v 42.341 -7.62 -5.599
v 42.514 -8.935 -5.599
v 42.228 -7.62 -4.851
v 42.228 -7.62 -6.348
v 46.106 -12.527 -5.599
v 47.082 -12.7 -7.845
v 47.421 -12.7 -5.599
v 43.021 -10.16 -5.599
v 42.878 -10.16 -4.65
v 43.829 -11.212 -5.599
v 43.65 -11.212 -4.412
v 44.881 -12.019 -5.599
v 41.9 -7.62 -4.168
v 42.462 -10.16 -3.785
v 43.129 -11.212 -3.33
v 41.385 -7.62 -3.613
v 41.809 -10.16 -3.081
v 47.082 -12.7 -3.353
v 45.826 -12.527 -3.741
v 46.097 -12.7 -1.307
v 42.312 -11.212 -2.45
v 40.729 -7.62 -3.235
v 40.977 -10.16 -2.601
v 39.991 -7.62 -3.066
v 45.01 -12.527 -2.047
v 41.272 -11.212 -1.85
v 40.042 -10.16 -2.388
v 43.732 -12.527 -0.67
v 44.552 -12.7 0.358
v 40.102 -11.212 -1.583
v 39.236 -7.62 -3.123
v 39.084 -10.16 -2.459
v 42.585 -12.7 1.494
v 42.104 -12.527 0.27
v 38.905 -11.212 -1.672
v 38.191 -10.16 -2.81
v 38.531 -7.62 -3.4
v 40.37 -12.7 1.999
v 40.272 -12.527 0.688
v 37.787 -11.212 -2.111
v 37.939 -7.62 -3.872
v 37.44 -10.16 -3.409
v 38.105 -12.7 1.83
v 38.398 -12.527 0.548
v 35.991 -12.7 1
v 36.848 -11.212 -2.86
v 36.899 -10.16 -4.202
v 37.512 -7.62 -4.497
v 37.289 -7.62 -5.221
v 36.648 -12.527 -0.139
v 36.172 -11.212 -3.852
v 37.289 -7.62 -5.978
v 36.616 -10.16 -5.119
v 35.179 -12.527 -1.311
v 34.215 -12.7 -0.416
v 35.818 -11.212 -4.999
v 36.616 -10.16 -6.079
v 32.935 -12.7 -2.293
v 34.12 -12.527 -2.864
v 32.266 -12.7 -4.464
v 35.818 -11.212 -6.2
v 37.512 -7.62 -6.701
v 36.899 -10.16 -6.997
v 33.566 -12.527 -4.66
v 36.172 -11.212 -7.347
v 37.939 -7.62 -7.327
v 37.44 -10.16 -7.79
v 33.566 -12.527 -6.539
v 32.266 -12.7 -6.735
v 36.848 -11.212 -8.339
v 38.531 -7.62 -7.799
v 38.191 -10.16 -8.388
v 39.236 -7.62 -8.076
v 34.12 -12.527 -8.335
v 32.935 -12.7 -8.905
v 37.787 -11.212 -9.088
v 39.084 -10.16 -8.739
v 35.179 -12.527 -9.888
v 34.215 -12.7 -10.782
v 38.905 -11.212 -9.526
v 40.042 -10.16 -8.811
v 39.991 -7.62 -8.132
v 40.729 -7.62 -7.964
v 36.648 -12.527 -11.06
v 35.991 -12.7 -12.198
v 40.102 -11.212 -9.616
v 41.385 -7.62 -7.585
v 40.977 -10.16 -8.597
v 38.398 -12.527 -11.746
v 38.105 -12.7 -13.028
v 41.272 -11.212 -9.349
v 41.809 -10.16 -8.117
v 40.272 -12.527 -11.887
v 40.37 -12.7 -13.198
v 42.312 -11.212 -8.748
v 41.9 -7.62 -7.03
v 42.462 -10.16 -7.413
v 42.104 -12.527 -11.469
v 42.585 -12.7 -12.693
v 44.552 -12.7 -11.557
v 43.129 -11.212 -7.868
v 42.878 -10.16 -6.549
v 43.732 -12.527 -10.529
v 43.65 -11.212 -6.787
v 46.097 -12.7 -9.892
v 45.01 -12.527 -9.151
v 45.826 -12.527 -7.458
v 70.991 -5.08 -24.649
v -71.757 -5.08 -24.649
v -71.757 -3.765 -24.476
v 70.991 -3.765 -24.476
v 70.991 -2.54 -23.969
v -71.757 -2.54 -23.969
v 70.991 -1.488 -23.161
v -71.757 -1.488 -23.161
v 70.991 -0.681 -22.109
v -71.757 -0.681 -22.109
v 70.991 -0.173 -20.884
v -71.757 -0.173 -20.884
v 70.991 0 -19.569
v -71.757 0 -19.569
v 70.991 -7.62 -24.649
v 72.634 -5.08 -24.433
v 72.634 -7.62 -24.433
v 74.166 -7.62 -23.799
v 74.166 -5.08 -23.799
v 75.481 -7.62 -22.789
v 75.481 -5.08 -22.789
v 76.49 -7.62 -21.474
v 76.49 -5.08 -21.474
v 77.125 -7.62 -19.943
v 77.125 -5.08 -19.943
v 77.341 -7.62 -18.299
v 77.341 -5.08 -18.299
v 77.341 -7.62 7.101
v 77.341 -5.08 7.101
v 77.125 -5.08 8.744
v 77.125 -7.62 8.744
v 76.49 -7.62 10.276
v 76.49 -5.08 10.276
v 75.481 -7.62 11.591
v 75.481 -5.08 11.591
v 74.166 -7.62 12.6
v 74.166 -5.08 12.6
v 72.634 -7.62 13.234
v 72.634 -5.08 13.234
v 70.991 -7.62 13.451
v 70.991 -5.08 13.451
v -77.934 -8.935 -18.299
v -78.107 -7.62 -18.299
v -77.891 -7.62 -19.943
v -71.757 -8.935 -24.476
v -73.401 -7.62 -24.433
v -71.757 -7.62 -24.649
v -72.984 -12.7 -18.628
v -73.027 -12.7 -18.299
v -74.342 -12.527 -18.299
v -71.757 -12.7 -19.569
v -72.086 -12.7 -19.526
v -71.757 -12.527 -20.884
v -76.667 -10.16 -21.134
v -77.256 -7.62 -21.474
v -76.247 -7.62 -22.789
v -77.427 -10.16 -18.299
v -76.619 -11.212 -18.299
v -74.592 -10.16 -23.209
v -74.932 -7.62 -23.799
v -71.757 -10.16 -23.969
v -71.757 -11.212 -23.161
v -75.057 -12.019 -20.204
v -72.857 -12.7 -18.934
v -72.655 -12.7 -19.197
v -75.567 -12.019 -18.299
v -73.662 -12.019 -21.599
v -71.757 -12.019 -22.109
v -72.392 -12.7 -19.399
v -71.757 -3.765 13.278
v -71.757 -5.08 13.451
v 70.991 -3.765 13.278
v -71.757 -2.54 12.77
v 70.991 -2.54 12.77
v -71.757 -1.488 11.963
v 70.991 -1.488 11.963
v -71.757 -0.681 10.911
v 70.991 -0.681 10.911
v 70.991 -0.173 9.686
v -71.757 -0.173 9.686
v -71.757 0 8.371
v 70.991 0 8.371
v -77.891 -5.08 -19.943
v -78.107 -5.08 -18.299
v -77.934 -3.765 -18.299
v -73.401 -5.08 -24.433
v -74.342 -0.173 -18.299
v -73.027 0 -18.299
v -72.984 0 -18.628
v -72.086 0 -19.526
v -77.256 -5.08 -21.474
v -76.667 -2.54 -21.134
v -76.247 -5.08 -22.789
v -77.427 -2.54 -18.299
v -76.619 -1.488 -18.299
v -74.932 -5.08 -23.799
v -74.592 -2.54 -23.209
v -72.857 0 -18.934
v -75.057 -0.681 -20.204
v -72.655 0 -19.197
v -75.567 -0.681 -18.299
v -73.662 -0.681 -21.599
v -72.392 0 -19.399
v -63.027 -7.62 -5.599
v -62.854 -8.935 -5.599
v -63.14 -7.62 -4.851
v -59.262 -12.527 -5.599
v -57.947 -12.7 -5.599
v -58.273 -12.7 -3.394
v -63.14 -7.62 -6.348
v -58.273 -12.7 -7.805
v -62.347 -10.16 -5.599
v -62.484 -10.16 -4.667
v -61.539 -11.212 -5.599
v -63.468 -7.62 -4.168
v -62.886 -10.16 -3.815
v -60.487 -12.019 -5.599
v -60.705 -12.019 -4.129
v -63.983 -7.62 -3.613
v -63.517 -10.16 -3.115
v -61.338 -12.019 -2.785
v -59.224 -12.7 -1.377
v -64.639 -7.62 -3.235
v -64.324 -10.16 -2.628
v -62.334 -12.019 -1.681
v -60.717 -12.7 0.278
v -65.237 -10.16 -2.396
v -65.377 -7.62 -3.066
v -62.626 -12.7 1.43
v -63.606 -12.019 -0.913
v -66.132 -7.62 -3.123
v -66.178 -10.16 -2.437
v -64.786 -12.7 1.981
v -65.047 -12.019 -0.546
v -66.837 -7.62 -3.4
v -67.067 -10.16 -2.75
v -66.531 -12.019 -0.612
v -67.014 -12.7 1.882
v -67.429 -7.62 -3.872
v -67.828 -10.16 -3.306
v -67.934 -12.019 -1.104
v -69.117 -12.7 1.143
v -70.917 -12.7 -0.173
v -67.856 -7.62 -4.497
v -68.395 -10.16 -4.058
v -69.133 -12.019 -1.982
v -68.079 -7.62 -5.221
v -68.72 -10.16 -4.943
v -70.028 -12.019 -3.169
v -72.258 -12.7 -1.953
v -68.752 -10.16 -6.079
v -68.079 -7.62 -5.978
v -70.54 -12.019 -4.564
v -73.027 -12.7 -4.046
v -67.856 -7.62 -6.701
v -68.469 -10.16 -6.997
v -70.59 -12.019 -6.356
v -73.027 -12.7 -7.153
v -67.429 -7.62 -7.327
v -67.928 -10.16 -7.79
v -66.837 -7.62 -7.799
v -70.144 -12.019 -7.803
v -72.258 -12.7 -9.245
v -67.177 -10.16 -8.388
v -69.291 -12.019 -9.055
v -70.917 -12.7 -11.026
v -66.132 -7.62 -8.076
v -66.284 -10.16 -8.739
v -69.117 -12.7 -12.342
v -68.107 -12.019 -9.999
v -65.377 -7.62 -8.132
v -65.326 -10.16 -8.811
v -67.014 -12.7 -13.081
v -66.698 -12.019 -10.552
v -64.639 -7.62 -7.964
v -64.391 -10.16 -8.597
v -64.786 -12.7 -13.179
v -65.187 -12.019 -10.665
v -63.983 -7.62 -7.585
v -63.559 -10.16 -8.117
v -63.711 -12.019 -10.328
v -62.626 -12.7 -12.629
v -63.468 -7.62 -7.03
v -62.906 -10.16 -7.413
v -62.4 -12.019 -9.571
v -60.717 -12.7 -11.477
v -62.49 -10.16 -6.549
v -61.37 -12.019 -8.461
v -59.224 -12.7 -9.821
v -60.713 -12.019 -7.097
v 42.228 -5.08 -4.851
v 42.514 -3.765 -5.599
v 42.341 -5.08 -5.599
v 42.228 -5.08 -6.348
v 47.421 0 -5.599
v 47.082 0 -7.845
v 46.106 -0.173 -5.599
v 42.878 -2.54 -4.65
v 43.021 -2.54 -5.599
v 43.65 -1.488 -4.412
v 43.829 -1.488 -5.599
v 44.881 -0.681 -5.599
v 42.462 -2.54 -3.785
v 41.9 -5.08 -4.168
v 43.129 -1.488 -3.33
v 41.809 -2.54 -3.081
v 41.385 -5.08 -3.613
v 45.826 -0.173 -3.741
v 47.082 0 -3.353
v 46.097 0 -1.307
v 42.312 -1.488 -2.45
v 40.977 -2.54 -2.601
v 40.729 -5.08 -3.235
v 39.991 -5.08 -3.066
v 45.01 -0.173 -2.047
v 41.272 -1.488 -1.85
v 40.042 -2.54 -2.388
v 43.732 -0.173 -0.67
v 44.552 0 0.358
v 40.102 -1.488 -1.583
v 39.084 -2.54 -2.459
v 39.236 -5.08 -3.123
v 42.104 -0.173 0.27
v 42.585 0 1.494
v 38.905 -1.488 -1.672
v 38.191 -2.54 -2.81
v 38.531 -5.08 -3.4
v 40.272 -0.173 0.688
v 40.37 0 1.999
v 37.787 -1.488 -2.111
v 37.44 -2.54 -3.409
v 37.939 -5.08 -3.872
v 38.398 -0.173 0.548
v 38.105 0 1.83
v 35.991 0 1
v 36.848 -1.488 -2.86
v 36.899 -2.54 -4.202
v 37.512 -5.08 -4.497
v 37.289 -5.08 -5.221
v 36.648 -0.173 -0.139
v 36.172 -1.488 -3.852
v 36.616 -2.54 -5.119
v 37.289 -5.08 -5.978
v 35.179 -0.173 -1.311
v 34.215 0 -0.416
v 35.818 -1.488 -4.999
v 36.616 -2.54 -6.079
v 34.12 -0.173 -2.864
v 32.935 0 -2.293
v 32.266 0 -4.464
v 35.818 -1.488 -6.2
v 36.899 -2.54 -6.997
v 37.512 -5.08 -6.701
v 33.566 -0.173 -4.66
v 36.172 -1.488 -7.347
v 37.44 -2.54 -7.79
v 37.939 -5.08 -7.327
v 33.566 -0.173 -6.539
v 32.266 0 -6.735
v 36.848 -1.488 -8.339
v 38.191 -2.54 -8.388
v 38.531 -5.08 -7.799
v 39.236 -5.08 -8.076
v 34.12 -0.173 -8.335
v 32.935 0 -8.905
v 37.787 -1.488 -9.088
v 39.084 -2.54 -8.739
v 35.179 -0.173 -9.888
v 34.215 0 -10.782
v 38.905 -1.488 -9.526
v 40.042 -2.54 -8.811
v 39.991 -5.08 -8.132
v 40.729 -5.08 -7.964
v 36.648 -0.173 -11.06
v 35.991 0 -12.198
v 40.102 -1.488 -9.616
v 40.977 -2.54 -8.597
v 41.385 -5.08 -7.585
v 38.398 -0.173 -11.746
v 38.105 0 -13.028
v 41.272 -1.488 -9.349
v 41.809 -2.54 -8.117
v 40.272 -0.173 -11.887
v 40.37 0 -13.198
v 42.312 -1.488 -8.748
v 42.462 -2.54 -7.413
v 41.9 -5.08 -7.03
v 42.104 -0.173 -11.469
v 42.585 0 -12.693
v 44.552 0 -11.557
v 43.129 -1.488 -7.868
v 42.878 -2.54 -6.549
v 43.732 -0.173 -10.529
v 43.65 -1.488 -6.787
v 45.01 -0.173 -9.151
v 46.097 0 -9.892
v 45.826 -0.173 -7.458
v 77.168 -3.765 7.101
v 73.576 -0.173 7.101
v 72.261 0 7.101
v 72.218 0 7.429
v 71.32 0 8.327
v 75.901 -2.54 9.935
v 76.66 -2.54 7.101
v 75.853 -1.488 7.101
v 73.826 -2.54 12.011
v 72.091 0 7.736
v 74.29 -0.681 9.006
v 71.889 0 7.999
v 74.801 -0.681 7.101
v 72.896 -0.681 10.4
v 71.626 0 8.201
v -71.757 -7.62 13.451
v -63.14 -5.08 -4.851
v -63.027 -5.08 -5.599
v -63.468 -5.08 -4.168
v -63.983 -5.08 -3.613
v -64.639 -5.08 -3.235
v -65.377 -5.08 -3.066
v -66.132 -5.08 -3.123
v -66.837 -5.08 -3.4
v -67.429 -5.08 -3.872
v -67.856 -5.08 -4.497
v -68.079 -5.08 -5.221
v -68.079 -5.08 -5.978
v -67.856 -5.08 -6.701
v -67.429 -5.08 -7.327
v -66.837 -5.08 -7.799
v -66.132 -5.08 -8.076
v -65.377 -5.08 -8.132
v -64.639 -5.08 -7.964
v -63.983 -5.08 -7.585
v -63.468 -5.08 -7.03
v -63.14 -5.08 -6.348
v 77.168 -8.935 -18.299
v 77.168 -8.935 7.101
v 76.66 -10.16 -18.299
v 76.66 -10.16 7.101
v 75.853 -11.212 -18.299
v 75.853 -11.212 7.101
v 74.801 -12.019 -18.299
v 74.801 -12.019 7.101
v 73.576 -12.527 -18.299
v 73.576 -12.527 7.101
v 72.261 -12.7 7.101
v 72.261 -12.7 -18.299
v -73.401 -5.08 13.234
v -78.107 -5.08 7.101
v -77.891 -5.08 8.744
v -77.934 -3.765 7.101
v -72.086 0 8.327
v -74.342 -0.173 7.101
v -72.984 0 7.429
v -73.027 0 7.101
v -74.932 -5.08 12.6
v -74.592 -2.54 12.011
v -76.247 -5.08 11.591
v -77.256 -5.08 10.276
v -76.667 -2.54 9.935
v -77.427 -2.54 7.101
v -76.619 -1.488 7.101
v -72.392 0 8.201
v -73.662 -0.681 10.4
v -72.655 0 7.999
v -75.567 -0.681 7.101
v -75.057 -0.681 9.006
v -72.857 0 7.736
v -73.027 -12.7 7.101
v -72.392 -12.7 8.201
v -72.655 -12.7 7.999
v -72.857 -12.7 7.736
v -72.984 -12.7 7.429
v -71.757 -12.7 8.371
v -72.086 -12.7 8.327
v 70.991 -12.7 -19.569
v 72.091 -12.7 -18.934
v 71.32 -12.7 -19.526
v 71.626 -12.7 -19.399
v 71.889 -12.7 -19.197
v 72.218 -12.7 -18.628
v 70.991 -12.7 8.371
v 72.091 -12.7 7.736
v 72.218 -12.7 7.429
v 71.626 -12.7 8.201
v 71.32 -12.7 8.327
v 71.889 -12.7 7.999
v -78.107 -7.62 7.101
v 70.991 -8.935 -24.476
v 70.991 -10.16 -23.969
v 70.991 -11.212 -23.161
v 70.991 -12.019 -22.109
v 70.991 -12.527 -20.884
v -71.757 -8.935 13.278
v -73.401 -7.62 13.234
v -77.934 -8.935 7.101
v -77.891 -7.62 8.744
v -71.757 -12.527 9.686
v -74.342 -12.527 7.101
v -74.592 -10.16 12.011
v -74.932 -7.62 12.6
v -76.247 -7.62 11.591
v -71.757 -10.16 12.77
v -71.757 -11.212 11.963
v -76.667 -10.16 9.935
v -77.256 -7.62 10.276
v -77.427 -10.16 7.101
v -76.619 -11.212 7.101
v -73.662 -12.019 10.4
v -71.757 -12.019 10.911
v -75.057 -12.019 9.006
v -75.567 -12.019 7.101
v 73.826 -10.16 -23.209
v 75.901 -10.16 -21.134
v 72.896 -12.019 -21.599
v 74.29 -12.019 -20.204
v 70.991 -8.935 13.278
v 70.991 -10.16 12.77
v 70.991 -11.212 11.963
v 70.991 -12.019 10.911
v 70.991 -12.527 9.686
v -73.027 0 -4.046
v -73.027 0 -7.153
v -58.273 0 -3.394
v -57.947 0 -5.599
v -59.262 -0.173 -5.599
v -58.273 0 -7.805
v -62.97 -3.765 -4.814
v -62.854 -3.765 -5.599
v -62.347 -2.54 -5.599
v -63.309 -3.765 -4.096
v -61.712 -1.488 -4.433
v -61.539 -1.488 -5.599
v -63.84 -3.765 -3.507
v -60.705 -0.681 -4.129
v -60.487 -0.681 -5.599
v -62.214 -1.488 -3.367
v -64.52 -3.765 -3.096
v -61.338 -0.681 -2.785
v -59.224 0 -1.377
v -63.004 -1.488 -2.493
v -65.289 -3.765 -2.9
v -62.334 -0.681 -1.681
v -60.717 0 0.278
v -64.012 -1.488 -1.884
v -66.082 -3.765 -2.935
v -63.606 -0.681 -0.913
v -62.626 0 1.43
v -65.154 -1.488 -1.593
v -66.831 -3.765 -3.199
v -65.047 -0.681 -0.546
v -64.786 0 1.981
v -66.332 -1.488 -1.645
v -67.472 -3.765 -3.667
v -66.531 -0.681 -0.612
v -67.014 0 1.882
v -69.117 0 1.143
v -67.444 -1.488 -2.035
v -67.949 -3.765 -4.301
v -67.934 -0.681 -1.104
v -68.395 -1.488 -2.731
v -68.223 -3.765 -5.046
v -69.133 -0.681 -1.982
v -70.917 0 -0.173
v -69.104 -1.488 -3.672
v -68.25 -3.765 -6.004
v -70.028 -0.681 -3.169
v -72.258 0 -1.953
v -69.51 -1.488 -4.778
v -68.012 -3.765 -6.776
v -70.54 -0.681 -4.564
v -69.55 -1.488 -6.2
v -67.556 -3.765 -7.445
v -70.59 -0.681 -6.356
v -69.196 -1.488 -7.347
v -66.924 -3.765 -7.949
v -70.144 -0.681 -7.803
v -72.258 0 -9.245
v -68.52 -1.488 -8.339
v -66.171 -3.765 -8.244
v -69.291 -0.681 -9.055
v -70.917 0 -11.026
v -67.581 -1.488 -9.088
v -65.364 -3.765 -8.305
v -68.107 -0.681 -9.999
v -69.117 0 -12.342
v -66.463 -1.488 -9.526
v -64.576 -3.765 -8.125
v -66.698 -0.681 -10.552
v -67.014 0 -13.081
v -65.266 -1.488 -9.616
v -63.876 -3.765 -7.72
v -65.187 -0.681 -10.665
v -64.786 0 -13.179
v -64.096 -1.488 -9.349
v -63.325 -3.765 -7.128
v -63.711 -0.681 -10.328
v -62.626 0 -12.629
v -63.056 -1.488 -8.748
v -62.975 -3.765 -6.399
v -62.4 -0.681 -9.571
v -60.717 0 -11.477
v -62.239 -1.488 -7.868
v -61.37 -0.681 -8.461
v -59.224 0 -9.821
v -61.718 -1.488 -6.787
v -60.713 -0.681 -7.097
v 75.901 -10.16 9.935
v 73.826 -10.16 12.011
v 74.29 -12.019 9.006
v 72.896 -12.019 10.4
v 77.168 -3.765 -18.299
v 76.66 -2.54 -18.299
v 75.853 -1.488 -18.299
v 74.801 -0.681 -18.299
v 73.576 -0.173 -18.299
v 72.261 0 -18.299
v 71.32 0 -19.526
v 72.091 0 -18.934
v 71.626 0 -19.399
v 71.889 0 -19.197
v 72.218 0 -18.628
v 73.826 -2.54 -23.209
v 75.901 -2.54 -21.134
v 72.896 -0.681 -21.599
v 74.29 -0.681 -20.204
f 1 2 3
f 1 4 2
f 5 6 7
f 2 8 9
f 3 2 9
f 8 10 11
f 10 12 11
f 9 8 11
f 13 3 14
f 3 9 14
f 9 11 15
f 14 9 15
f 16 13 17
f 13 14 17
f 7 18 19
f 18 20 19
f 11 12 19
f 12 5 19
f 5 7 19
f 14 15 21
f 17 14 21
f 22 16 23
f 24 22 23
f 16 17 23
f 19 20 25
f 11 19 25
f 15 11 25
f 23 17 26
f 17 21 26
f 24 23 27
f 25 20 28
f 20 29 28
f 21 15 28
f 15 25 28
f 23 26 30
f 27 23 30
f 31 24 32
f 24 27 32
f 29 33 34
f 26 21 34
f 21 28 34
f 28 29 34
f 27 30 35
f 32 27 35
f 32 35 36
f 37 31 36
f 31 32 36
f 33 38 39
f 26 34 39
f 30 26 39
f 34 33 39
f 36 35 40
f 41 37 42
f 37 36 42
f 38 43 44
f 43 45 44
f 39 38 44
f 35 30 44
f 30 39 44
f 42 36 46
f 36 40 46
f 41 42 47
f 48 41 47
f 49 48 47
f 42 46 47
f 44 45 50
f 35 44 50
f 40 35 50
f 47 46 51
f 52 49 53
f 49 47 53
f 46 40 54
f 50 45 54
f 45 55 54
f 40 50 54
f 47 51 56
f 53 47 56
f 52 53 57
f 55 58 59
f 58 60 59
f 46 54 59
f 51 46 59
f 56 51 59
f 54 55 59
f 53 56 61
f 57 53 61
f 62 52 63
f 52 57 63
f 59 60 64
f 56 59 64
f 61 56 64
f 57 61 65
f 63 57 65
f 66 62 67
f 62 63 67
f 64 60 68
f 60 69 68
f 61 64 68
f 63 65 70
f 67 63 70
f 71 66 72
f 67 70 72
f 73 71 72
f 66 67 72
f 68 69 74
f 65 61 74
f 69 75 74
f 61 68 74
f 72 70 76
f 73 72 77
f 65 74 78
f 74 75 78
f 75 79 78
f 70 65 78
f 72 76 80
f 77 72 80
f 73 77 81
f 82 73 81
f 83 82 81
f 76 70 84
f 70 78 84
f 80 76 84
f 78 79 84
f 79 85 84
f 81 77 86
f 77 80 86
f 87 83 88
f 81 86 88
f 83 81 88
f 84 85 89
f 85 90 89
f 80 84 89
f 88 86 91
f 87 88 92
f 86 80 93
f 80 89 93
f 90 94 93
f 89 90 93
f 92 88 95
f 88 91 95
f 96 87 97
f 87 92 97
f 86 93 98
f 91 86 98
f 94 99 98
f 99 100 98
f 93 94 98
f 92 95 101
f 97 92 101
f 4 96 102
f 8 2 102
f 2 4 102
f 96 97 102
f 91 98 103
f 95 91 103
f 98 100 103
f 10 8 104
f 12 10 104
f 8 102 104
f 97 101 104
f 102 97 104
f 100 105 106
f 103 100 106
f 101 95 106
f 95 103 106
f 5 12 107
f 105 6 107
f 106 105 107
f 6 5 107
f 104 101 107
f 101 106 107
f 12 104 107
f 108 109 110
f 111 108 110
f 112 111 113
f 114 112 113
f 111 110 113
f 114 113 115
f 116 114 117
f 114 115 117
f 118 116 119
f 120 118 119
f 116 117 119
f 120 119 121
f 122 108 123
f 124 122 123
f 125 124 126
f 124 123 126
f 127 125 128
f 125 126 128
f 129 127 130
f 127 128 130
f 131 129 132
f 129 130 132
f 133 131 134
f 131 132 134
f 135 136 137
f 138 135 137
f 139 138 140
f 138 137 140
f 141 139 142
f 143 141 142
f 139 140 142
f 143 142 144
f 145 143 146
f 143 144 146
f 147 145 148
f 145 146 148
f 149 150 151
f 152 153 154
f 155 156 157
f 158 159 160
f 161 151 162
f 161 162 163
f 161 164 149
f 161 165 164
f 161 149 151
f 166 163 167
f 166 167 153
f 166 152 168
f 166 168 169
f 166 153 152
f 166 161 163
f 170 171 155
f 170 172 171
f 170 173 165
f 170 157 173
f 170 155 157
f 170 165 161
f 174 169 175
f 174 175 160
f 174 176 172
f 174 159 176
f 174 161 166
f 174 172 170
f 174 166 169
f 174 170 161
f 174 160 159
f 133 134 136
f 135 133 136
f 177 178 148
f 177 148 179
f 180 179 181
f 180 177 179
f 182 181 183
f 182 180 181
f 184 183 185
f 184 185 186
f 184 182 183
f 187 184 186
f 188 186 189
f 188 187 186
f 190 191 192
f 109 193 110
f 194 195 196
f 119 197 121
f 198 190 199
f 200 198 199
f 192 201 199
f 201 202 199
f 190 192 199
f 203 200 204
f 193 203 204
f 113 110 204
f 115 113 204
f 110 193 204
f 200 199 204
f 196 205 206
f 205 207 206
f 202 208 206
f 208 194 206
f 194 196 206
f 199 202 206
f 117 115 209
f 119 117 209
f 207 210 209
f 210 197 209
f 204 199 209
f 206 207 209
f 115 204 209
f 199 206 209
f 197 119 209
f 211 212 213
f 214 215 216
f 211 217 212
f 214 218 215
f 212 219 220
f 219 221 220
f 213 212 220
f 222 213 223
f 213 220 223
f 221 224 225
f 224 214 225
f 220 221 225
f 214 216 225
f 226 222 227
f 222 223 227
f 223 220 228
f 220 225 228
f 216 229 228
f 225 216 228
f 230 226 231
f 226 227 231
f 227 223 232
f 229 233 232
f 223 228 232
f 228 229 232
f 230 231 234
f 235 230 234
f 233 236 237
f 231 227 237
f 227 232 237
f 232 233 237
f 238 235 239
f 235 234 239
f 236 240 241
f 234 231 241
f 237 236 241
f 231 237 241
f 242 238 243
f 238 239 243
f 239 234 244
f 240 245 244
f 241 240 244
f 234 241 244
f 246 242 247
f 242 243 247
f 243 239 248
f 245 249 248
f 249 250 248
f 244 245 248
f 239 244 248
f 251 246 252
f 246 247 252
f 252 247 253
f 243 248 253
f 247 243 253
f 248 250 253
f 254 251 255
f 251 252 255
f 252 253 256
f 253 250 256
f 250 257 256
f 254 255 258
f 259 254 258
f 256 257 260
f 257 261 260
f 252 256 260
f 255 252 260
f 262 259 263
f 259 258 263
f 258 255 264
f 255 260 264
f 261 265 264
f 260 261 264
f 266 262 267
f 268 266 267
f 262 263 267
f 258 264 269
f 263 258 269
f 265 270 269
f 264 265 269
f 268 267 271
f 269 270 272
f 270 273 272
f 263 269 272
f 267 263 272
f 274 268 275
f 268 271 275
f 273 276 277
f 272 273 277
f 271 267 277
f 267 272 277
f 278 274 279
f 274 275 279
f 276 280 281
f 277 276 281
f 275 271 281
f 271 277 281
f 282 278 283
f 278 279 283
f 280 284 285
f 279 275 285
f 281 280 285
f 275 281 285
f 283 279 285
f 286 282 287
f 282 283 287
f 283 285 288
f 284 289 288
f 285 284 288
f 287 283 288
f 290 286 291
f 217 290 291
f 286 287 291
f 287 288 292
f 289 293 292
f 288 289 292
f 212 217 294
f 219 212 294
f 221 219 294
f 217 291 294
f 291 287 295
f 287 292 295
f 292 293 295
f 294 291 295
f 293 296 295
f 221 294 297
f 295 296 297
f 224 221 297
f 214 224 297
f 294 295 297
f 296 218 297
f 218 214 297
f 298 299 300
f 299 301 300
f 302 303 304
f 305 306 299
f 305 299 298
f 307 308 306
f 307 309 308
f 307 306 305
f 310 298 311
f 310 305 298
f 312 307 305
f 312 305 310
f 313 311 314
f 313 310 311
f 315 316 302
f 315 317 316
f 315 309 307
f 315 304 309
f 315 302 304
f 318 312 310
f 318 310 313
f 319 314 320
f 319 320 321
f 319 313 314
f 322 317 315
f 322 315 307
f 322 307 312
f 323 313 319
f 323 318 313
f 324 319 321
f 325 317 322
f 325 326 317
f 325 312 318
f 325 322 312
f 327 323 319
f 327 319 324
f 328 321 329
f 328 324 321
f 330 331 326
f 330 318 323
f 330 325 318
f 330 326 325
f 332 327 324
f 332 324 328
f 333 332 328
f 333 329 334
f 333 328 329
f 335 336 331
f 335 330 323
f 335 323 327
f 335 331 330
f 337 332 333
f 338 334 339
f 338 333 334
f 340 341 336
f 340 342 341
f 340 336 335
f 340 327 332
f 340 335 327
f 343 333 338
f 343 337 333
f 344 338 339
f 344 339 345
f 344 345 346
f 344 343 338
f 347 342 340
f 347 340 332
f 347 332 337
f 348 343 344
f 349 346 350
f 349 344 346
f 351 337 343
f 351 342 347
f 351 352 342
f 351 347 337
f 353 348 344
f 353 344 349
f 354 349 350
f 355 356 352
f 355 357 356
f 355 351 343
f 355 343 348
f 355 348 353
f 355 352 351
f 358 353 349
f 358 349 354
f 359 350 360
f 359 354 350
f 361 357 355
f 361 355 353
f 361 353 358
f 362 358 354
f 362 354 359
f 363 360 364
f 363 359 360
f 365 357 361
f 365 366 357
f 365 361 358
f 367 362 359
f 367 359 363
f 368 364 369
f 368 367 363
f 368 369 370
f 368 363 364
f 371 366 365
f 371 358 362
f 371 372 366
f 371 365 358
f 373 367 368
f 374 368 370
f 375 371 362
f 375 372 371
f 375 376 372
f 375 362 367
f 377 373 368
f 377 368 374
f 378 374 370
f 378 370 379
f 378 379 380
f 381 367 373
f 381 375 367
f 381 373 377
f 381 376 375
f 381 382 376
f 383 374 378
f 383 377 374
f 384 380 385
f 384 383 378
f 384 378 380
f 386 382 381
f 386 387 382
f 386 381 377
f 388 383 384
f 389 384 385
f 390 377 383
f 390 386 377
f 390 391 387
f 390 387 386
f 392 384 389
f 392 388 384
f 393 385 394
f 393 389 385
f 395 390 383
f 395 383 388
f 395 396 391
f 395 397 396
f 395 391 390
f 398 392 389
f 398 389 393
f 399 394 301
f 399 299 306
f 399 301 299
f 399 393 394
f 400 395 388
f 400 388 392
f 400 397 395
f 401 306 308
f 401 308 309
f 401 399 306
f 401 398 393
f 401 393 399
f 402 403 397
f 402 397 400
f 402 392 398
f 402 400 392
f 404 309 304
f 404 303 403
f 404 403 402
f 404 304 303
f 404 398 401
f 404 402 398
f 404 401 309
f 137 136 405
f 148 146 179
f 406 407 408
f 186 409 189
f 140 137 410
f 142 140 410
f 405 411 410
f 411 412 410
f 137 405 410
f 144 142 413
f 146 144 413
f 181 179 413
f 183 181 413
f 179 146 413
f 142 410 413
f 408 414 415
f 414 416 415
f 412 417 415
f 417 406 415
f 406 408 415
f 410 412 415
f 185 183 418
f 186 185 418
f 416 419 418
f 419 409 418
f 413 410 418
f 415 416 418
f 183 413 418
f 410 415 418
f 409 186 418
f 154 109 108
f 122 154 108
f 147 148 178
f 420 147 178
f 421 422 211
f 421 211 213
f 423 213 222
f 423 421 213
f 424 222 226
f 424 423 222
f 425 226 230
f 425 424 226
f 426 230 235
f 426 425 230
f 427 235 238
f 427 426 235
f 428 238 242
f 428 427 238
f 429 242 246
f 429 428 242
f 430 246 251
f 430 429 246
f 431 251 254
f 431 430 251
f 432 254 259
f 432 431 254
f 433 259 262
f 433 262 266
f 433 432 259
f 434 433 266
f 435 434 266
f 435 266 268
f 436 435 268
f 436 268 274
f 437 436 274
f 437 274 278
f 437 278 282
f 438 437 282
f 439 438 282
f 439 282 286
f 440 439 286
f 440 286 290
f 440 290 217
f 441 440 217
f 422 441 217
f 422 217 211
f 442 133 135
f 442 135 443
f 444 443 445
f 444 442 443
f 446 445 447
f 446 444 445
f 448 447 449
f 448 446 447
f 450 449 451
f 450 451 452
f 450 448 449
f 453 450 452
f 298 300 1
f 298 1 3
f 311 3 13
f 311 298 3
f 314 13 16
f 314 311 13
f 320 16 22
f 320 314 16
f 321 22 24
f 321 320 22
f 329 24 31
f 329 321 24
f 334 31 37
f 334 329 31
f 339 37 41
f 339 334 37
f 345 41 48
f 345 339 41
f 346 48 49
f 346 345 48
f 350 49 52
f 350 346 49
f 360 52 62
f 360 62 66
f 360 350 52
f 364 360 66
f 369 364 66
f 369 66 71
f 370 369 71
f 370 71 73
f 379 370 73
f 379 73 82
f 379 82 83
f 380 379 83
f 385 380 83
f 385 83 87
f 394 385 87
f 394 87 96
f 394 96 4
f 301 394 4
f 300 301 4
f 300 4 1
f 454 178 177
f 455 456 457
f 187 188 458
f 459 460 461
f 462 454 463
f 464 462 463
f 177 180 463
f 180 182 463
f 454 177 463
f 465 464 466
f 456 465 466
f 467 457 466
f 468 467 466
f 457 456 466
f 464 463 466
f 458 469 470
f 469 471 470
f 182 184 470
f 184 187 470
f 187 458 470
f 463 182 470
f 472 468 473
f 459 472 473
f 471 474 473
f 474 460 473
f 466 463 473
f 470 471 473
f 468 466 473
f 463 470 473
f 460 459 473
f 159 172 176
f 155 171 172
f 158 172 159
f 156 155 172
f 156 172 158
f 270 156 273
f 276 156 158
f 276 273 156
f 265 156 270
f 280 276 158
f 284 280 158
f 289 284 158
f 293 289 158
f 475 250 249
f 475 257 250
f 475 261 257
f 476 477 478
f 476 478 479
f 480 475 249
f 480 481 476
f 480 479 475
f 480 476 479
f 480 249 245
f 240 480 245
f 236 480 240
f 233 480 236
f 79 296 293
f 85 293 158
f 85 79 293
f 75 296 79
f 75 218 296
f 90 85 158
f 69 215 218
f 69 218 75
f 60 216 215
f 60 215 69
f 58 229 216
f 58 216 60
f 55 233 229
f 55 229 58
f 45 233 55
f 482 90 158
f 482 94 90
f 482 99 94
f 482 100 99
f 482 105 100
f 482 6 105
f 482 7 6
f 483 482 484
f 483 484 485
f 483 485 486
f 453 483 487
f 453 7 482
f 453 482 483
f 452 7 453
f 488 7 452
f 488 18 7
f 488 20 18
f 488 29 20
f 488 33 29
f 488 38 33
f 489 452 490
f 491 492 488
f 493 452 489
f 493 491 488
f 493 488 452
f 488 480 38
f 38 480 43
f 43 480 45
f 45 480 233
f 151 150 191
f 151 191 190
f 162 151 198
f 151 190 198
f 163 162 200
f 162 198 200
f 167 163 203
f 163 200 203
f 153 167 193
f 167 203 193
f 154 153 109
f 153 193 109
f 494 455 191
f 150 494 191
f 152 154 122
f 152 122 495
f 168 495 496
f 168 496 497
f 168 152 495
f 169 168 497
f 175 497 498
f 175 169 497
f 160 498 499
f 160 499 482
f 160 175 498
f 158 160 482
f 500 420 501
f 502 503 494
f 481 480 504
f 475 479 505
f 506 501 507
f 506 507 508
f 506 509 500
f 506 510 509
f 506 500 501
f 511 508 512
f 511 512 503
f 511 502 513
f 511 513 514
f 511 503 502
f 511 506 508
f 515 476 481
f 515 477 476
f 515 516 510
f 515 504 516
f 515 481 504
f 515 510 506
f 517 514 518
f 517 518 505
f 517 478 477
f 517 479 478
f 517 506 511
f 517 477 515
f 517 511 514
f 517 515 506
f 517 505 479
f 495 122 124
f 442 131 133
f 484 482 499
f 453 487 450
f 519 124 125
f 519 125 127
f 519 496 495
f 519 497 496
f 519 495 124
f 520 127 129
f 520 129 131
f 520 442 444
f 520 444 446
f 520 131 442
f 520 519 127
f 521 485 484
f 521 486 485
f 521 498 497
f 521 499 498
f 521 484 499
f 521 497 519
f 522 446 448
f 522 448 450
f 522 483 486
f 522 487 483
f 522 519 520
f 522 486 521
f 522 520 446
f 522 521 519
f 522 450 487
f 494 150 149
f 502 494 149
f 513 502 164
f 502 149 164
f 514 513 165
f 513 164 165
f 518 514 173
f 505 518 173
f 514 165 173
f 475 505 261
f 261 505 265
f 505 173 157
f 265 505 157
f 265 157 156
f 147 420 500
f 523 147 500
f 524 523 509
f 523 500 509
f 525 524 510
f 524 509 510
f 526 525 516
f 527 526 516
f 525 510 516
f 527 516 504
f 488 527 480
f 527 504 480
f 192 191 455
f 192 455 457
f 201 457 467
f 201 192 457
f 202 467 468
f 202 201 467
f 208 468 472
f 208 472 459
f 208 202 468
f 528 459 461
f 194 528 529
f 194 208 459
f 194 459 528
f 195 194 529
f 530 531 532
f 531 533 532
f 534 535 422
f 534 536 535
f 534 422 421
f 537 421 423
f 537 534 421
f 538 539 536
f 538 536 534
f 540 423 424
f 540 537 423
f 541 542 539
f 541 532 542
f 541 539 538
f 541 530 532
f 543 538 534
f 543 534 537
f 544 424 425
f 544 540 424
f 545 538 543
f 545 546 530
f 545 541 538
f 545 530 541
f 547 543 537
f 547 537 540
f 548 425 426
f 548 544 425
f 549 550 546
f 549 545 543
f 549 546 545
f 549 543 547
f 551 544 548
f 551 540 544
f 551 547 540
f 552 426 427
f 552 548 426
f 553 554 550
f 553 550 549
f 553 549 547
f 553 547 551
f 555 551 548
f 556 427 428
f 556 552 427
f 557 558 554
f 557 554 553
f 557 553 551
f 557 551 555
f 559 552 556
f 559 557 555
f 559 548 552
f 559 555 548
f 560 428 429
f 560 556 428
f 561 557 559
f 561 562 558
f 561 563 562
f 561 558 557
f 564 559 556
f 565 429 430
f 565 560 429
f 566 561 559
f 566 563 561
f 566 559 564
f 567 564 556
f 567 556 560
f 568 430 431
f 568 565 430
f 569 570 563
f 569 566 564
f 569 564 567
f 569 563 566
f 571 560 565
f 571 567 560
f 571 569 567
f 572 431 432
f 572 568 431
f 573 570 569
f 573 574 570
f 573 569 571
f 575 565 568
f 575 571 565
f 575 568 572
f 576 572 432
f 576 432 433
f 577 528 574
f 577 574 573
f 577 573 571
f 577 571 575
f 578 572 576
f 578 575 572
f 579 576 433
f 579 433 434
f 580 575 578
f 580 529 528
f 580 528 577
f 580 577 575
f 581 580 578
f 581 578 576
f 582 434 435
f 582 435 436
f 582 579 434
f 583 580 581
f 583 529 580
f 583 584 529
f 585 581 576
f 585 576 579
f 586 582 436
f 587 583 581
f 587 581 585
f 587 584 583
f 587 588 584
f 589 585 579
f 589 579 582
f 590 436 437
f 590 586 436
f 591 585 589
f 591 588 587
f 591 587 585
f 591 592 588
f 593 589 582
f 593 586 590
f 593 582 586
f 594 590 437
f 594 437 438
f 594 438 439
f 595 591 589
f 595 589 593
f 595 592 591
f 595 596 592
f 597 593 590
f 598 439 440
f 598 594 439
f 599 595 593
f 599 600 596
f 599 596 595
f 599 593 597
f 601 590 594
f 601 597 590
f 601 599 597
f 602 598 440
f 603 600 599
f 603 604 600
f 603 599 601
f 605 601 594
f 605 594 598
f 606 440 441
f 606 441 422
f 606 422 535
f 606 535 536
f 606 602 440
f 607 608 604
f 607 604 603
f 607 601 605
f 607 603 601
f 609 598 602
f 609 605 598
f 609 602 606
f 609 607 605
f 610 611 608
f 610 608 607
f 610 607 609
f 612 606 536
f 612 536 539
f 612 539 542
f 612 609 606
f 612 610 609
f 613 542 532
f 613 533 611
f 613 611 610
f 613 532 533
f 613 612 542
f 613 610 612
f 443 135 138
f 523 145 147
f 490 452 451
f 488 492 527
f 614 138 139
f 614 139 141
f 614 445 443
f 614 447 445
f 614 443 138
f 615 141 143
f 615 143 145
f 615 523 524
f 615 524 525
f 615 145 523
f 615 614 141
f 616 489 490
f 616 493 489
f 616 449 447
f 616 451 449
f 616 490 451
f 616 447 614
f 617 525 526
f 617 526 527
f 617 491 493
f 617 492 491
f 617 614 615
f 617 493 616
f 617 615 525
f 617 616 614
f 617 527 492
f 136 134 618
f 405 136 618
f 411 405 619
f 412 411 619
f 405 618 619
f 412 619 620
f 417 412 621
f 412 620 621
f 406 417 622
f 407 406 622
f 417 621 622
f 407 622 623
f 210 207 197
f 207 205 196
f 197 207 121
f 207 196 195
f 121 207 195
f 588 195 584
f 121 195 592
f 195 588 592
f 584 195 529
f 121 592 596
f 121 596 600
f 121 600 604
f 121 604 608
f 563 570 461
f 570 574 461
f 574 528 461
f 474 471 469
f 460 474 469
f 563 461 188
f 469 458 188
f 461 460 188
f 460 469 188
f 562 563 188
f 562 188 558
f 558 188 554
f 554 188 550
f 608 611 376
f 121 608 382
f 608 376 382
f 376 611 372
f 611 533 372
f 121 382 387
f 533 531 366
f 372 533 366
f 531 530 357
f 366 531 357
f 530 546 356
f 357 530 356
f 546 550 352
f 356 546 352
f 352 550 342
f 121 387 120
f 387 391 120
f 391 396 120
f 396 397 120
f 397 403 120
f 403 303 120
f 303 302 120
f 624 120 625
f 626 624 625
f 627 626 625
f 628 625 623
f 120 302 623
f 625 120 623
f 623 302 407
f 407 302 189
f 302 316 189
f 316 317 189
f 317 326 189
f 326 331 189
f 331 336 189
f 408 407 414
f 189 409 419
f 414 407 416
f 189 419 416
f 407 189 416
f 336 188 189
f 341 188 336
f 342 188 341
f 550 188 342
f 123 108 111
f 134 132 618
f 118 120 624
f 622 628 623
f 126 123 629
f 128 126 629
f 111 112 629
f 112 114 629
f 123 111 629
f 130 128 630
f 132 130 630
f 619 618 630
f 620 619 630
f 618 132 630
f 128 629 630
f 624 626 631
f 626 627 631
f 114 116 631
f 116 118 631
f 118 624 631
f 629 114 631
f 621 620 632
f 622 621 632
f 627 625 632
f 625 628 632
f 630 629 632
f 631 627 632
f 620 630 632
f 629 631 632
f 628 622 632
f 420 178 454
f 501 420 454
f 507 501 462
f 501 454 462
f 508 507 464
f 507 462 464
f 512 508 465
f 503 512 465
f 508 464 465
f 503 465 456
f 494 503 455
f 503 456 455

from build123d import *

# Parameters (mm, degrees)
F0_R         = 2.54
F1_DEPTH     = 12.7
F2_T1_DEPTH  = 142.748
F2_T3_DEPTH  = 25.4
F2_T6_ANGLE  = 90
F2_T8_ANGLE  = 90
F2_T10_ANGLE = 90
F2_T12_ANGLE = 90
F2_T18_ANGLE = 90
F2_T20_ANGLE = 90
F2_T22_ANGLE = 90
F2_T24_ANGLE = 90


# Not quite as in the source:
# - a fillet or chamfer that OpenCascade refuses, or shapes differently, is made with other operations: its cross-section is extruded or revolved along the edge and cut away or added


with BuildPart() as f1:
    # F0 (on Front) → F1 (new body)
    with BuildSketch(Plane.XZ):
        with BuildLine():
            Line((70.9908799698, 13.4507374847), (-71.7571200302, 13.4507374847))
            ThreePointArc((-71.7571200302, 13.4507374847), (-76.2472480907, 11.5908655453), (-78.1071200302, 7.1007374847))
            Line((-78.1071200302, 7.1007374847), (-78.1071200302, -18.2992625153))
            ThreePointArc((-78.1071200302, -18.2992625153), (-76.2472480907, -22.7893905758), (-71.7571200302, -24.6492625153))
            Line((-71.7571200302, -24.6492625153), (70.9908799698, -24.6492625153))
            ThreePointArc((70.9908799698, -24.6492625153), (75.4810080304, -22.7893905758), (77.3408799698, -18.2992625153))
            Line((77.3408799698, -18.2992625153), (77.3408799698, 7.1007374847))
            ThreePointArc((77.3408799698, 7.1007374847), (75.4810080304, 11.5908655453), (70.9908799698, 13.4507374847))
        make_face()
        with Locations((-65.5671200302, -5.5992625153)):
            Circle(F0_R, mode=Mode.SUBTRACT)
        with Locations((39.8008799698, -5.5992626585)):
            Circle(F0_R, mode=Mode.SUBTRACT)
    extrude(amount=F1_DEPTH)

    # F2: fillet of radius 5.08 on 20 edges, made by hand

    # F2_s2 → F2_t1 (cut)
    with BuildSketch(Plane.YZ.offset(-71.7571200302)):
        with BuildLine():
            ThreePointArc((-7.62, 13.4507374847), (-11.2121024484, 11.9628399332), (-12.7, 8.3707374847))
            Line((-12.7, 8.3707374847), (-12.7, 13.4507374847))
            Line((-12.7, 13.4507374847), (-7.62, 13.4507374847))
        make_face()
        with BuildLine():
            ThreePointArc((-5.08, 13.4507374847), (-1.4878975516, 11.9628399332), (0, 8.3707374847))
            Line((0, 8.3707374847), (0, 13.4507374847))
            Line((0, 13.4507374847), (-5.08, 13.4507374847))
        make_face()
        with BuildLine():
            ThreePointArc((-7.62, -24.6492625153), (-11.2121024484, -23.1613649637), (-12.7, -19.5692625153))
            Line((-12.7, -19.5692625153), (-12.7, -24.6492625153))
            Line((-12.7, -24.6492625153), (-7.62, -24.6492625153))
        make_face()
        with BuildLine():
            ThreePointArc((-5.08, -24.6492625153), (-1.4878975516, -23.1613649637), (0, -19.5692625153))
            Line((0, -19.5692625153), (0, -24.6492625153))
            Line((0, -24.6492625153), (-5.08, -24.6492625153))
        make_face()
    extrude(amount=F2_T1_DEPTH, mode=Mode.SUBTRACT)

    # F2_s4 → F2_t3 (cut)
    with BuildSketch(Plane.XY.offset(-18.2992625153)):
        with BuildLine():
            ThreePointArc((-78.1071200302, -5.08), (-76.6192224786, -1.4878975516), (-73.0271200302, 0))
            Line((-73.0271200302, 0), (-78.1071200302, 0))
            Line((-78.1071200302, 0), (-78.1071200302, -5.08))
        make_face()
        with BuildLine():
            ThreePointArc((77.3408799698, -5.08), (75.8529824183, -1.4878975516), (72.2608799698, 0))
            Line((72.2608799698, 0), (77.3408799698, 0))
            Line((77.3408799698, 0), (77.3408799698, -5.08))
        make_face()
        with BuildLine():
            ThreePointArc((-78.1071200302, -7.62), (-76.6192224786, -11.2121024484), (-73.0271200302, -12.7))
            Line((-73.0271200302, -12.7), (-78.1071200302, -12.7))
            Line((-78.1071200302, -12.7), (-78.1071200302, -7.62))
        make_face()
        with BuildLine():
            ThreePointArc((77.3408799698, -7.62), (75.8529824183, -11.2121024484), (72.2608799698, -12.7))
            Line((72.2608799698, -12.7), (77.3408799698, -12.7))
            Line((77.3408799698, -12.7), (77.3408799698, -7.62))
        make_face()
    extrude(amount=F2_T3_DEPTH, mode=Mode.SUBTRACT)

    # F2_s5 → F2_t6 (revolve, cut)
    with BuildSketch(Plane.YZ.offset(-71.7571200302)):
        with BuildLine():
            ThreePointArc((-5.08, 13.4507374847), (-1.4878975516, 11.9628399332), (0, 8.3707374847))
            Line((0, 8.3707374847), (0, 13.4507374847))
            Line((0, 13.4507374847), (-5.08, 13.4507374847))
        make_face()
    revolve(axis=Axis((-71.7571200302, 0, 7.1007374847), (0, -1, 0)), revolution_arc=F2_T6_ANGLE, mode=Mode.SUBTRACT)

    # F2_s7 → F2_t8 (revolve, cut)
    with BuildSketch(Plane.XY.offset(-18.2992625153)):
        with BuildLine():
            ThreePointArc((-78.1071200302, -5.08), (-76.6192224786, -1.4878975516), (-73.0271200302, 0))
            Line((-73.0271200302, 0), (-78.1071200302, 0))
            Line((-78.1071200302, 0), (-78.1071200302, -5.08))
        make_face()
    revolve(axis=Axis((-71.7571200302, 0, -18.2992625153), (0, -1, 0)), revolution_arc=F2_T8_ANGLE, mode=Mode.SUBTRACT)

    # F2_s9 → F2_t10 (revolve, cut)
    with BuildSketch(Plane.YZ.offset(70.9908799698)):
        with BuildLine():
            ThreePointArc((-5.08, -24.6492625153), (-1.4878975516, -23.1613649637), (0, -19.5692625153))
            Line((0, -19.5692625153), (0, -24.6492625153))
            Line((0, -24.6492625153), (-5.08, -24.6492625153))
        make_face()
    revolve(axis=Axis((70.9908799698, 0, -18.2992625153), (0, -1, 0)), revolution_arc=F2_T10_ANGLE, mode=Mode.SUBTRACT)

    # F2_s11 → F2_t12 (revolve, cut)
    with BuildSketch(Plane.XY.offset(7.1007374847)):
        with BuildLine():
            ThreePointArc((77.3408799698, -5.08), (75.8529824183, -1.4878975516), (72.2608799698, 0))
            Line((72.2608799698, 0), (77.3408799698, 0))
            Line((77.3408799698, 0), (77.3408799698, -5.08))
        make_face()
    revolve(axis=Axis((70.9908799698, 0, 7.1007374847), (0, -1, 0)), revolution_arc=F2_T12_ANGLE, mode=Mode.SUBTRACT)

    # F2_s13 → F2_t14 (revolve, cut)
    with BuildSketch(Plane.XY.offset(-5.5992625153)):
        with BuildLine():
            ThreePointArc((-63.0271200302, -5.08), (-61.5392224786, -1.4878975516), (-57.9471200302, 0))
            Line((-57.9471200302, 0), (-63.0271200302, 0))
            Line((-63.0271200302, 0), (-63.0271200302, -5.08))
        make_face()
    revolve(axis=Axis((-65.5671200302, 0, -5.5992625153), (0, -1, 0)), mode=Mode.SUBTRACT)

    # F2_s15 → F2_t16 (revolve, cut)
    with BuildSketch(Plane.XY.offset(-5.5992626585)):
        with BuildLine():
            ThreePointArc((42.3408799698, -5.08), (43.8287775214, -1.4878975516), (47.4208799698, 0))
            Line((47.4208799698, 0), (42.3408799698, 0))
            Line((42.3408799698, 0), (42.3408799698, -5.08))
        make_face()
    revolve(axis=Axis((39.8008799698, 0, -5.5992626585), (0, -1, 0)), mode=Mode.SUBTRACT)

    # F2_s17 → F2_t18 (revolve, cut)
    with BuildSketch(Plane.YZ.offset(-71.7571200302)):
        with BuildLine():
            ThreePointArc((-7.62, 13.4507374847), (-11.2121024484, 11.9628399332), (-12.7, 8.3707374847))
            Line((-12.7, 8.3707374847), (-12.7, 13.4507374847))
            Line((-12.7, 13.4507374847), (-7.62, 13.4507374847))
        make_face()
    revolve(axis=Axis((-71.7571200302, -12.7, 7.1007374847), (0, -1, 0)), revolution_arc=F2_T18_ANGLE, mode=Mode.SUBTRACT)

    # F2_s19 → F2_t20 (revolve, cut)
    with BuildSketch(Plane.XY.offset(-18.2992625153)):
        with BuildLine():
            ThreePointArc((-78.1071200302, -7.62), (-76.6192224786, -11.2121024484), (-73.0271200302, -12.7))
            Line((-73.0271200302, -12.7), (-78.1071200302, -12.7))
            Line((-78.1071200302, -12.7), (-78.1071200302, -7.62))
        make_face()
    revolve(axis=Axis((-71.7571200302, -12.7, -18.2992625153), (0, -1, 0)), revolution_arc=F2_T20_ANGLE, mode=Mode.SUBTRACT)

    # F2_s21 → F2_t22 (revolve, cut)
    with BuildSketch(Plane.YZ.offset(70.9908799698)):
        with BuildLine():
            ThreePointArc((-7.62, -24.6492625153), (-11.2121024484, -23.1613649637), (-12.7, -19.5692625153))
            Line((-12.7, -19.5692625153), (-12.7, -24.6492625153))
            Line((-12.7, -24.6492625153), (-7.62, -24.6492625153))
        make_face()
    revolve(axis=Axis((70.9908799698, -12.7, -18.2992625153), (0, -1, 0)), revolution_arc=F2_T22_ANGLE, mode=Mode.SUBTRACT)

    # F2_s23 → F2_t24 (revolve, cut)
    with BuildSketch(Plane.XY.offset(7.1007374847)):
        with BuildLine():
            ThreePointArc((77.3408799698, -7.62), (75.8529824183, -11.2121024484), (72.2608799698, -12.7))
            Line((72.2608799698, -12.7), (77.3408799698, -12.7))
            Line((77.3408799698, -12.7), (77.3408799698, -7.62))
        make_face()
    revolve(axis=Axis((70.9908799698, -12.7, 7.1007374847), (0, -1, 0)), revolution_arc=F2_T24_ANGLE, mode=Mode.SUBTRACT)

    # F2_s25 → F2_t26 (revolve, cut)
    with BuildSketch(Plane.XY.offset(-5.5992625153)):
        with BuildLine():
            ThreePointArc((-63.0271200302, -7.62), (-61.5392224786, -11.2121024484), (-57.9471200302, -12.7))
            Line((-57.9471200302, -12.7), (-63.0271200302, -12.7))
            Line((-63.0271200302, -12.7), (-63.0271200302, -7.62))
        make_face()
    revolve(axis=Axis((-65.5671200302, -12.7, -5.5992625153), (0, -1, 0)), mode=Mode.SUBTRACT)

    # F2_s27 → F2_t28 (revolve, cut)
    with BuildSketch(Plane.XY.offset(-5.5992626585)):
        with BuildLine():
            ThreePointArc((42.3408799698, -7.62), (43.8287775214, -11.2121024484), (47.4208799698, -12.7))
            Line((47.4208799698, -12.7), (42.3408799698, -12.7))
            Line((42.3408799698, -12.7), (42.3408799698, -7.62))
        make_face()
    revolve(axis=Axis((39.8008799698, -12.7, -5.5992626585), (0, -1, 0)), mode=Mode.SUBTRACT)


solid = f1.part
